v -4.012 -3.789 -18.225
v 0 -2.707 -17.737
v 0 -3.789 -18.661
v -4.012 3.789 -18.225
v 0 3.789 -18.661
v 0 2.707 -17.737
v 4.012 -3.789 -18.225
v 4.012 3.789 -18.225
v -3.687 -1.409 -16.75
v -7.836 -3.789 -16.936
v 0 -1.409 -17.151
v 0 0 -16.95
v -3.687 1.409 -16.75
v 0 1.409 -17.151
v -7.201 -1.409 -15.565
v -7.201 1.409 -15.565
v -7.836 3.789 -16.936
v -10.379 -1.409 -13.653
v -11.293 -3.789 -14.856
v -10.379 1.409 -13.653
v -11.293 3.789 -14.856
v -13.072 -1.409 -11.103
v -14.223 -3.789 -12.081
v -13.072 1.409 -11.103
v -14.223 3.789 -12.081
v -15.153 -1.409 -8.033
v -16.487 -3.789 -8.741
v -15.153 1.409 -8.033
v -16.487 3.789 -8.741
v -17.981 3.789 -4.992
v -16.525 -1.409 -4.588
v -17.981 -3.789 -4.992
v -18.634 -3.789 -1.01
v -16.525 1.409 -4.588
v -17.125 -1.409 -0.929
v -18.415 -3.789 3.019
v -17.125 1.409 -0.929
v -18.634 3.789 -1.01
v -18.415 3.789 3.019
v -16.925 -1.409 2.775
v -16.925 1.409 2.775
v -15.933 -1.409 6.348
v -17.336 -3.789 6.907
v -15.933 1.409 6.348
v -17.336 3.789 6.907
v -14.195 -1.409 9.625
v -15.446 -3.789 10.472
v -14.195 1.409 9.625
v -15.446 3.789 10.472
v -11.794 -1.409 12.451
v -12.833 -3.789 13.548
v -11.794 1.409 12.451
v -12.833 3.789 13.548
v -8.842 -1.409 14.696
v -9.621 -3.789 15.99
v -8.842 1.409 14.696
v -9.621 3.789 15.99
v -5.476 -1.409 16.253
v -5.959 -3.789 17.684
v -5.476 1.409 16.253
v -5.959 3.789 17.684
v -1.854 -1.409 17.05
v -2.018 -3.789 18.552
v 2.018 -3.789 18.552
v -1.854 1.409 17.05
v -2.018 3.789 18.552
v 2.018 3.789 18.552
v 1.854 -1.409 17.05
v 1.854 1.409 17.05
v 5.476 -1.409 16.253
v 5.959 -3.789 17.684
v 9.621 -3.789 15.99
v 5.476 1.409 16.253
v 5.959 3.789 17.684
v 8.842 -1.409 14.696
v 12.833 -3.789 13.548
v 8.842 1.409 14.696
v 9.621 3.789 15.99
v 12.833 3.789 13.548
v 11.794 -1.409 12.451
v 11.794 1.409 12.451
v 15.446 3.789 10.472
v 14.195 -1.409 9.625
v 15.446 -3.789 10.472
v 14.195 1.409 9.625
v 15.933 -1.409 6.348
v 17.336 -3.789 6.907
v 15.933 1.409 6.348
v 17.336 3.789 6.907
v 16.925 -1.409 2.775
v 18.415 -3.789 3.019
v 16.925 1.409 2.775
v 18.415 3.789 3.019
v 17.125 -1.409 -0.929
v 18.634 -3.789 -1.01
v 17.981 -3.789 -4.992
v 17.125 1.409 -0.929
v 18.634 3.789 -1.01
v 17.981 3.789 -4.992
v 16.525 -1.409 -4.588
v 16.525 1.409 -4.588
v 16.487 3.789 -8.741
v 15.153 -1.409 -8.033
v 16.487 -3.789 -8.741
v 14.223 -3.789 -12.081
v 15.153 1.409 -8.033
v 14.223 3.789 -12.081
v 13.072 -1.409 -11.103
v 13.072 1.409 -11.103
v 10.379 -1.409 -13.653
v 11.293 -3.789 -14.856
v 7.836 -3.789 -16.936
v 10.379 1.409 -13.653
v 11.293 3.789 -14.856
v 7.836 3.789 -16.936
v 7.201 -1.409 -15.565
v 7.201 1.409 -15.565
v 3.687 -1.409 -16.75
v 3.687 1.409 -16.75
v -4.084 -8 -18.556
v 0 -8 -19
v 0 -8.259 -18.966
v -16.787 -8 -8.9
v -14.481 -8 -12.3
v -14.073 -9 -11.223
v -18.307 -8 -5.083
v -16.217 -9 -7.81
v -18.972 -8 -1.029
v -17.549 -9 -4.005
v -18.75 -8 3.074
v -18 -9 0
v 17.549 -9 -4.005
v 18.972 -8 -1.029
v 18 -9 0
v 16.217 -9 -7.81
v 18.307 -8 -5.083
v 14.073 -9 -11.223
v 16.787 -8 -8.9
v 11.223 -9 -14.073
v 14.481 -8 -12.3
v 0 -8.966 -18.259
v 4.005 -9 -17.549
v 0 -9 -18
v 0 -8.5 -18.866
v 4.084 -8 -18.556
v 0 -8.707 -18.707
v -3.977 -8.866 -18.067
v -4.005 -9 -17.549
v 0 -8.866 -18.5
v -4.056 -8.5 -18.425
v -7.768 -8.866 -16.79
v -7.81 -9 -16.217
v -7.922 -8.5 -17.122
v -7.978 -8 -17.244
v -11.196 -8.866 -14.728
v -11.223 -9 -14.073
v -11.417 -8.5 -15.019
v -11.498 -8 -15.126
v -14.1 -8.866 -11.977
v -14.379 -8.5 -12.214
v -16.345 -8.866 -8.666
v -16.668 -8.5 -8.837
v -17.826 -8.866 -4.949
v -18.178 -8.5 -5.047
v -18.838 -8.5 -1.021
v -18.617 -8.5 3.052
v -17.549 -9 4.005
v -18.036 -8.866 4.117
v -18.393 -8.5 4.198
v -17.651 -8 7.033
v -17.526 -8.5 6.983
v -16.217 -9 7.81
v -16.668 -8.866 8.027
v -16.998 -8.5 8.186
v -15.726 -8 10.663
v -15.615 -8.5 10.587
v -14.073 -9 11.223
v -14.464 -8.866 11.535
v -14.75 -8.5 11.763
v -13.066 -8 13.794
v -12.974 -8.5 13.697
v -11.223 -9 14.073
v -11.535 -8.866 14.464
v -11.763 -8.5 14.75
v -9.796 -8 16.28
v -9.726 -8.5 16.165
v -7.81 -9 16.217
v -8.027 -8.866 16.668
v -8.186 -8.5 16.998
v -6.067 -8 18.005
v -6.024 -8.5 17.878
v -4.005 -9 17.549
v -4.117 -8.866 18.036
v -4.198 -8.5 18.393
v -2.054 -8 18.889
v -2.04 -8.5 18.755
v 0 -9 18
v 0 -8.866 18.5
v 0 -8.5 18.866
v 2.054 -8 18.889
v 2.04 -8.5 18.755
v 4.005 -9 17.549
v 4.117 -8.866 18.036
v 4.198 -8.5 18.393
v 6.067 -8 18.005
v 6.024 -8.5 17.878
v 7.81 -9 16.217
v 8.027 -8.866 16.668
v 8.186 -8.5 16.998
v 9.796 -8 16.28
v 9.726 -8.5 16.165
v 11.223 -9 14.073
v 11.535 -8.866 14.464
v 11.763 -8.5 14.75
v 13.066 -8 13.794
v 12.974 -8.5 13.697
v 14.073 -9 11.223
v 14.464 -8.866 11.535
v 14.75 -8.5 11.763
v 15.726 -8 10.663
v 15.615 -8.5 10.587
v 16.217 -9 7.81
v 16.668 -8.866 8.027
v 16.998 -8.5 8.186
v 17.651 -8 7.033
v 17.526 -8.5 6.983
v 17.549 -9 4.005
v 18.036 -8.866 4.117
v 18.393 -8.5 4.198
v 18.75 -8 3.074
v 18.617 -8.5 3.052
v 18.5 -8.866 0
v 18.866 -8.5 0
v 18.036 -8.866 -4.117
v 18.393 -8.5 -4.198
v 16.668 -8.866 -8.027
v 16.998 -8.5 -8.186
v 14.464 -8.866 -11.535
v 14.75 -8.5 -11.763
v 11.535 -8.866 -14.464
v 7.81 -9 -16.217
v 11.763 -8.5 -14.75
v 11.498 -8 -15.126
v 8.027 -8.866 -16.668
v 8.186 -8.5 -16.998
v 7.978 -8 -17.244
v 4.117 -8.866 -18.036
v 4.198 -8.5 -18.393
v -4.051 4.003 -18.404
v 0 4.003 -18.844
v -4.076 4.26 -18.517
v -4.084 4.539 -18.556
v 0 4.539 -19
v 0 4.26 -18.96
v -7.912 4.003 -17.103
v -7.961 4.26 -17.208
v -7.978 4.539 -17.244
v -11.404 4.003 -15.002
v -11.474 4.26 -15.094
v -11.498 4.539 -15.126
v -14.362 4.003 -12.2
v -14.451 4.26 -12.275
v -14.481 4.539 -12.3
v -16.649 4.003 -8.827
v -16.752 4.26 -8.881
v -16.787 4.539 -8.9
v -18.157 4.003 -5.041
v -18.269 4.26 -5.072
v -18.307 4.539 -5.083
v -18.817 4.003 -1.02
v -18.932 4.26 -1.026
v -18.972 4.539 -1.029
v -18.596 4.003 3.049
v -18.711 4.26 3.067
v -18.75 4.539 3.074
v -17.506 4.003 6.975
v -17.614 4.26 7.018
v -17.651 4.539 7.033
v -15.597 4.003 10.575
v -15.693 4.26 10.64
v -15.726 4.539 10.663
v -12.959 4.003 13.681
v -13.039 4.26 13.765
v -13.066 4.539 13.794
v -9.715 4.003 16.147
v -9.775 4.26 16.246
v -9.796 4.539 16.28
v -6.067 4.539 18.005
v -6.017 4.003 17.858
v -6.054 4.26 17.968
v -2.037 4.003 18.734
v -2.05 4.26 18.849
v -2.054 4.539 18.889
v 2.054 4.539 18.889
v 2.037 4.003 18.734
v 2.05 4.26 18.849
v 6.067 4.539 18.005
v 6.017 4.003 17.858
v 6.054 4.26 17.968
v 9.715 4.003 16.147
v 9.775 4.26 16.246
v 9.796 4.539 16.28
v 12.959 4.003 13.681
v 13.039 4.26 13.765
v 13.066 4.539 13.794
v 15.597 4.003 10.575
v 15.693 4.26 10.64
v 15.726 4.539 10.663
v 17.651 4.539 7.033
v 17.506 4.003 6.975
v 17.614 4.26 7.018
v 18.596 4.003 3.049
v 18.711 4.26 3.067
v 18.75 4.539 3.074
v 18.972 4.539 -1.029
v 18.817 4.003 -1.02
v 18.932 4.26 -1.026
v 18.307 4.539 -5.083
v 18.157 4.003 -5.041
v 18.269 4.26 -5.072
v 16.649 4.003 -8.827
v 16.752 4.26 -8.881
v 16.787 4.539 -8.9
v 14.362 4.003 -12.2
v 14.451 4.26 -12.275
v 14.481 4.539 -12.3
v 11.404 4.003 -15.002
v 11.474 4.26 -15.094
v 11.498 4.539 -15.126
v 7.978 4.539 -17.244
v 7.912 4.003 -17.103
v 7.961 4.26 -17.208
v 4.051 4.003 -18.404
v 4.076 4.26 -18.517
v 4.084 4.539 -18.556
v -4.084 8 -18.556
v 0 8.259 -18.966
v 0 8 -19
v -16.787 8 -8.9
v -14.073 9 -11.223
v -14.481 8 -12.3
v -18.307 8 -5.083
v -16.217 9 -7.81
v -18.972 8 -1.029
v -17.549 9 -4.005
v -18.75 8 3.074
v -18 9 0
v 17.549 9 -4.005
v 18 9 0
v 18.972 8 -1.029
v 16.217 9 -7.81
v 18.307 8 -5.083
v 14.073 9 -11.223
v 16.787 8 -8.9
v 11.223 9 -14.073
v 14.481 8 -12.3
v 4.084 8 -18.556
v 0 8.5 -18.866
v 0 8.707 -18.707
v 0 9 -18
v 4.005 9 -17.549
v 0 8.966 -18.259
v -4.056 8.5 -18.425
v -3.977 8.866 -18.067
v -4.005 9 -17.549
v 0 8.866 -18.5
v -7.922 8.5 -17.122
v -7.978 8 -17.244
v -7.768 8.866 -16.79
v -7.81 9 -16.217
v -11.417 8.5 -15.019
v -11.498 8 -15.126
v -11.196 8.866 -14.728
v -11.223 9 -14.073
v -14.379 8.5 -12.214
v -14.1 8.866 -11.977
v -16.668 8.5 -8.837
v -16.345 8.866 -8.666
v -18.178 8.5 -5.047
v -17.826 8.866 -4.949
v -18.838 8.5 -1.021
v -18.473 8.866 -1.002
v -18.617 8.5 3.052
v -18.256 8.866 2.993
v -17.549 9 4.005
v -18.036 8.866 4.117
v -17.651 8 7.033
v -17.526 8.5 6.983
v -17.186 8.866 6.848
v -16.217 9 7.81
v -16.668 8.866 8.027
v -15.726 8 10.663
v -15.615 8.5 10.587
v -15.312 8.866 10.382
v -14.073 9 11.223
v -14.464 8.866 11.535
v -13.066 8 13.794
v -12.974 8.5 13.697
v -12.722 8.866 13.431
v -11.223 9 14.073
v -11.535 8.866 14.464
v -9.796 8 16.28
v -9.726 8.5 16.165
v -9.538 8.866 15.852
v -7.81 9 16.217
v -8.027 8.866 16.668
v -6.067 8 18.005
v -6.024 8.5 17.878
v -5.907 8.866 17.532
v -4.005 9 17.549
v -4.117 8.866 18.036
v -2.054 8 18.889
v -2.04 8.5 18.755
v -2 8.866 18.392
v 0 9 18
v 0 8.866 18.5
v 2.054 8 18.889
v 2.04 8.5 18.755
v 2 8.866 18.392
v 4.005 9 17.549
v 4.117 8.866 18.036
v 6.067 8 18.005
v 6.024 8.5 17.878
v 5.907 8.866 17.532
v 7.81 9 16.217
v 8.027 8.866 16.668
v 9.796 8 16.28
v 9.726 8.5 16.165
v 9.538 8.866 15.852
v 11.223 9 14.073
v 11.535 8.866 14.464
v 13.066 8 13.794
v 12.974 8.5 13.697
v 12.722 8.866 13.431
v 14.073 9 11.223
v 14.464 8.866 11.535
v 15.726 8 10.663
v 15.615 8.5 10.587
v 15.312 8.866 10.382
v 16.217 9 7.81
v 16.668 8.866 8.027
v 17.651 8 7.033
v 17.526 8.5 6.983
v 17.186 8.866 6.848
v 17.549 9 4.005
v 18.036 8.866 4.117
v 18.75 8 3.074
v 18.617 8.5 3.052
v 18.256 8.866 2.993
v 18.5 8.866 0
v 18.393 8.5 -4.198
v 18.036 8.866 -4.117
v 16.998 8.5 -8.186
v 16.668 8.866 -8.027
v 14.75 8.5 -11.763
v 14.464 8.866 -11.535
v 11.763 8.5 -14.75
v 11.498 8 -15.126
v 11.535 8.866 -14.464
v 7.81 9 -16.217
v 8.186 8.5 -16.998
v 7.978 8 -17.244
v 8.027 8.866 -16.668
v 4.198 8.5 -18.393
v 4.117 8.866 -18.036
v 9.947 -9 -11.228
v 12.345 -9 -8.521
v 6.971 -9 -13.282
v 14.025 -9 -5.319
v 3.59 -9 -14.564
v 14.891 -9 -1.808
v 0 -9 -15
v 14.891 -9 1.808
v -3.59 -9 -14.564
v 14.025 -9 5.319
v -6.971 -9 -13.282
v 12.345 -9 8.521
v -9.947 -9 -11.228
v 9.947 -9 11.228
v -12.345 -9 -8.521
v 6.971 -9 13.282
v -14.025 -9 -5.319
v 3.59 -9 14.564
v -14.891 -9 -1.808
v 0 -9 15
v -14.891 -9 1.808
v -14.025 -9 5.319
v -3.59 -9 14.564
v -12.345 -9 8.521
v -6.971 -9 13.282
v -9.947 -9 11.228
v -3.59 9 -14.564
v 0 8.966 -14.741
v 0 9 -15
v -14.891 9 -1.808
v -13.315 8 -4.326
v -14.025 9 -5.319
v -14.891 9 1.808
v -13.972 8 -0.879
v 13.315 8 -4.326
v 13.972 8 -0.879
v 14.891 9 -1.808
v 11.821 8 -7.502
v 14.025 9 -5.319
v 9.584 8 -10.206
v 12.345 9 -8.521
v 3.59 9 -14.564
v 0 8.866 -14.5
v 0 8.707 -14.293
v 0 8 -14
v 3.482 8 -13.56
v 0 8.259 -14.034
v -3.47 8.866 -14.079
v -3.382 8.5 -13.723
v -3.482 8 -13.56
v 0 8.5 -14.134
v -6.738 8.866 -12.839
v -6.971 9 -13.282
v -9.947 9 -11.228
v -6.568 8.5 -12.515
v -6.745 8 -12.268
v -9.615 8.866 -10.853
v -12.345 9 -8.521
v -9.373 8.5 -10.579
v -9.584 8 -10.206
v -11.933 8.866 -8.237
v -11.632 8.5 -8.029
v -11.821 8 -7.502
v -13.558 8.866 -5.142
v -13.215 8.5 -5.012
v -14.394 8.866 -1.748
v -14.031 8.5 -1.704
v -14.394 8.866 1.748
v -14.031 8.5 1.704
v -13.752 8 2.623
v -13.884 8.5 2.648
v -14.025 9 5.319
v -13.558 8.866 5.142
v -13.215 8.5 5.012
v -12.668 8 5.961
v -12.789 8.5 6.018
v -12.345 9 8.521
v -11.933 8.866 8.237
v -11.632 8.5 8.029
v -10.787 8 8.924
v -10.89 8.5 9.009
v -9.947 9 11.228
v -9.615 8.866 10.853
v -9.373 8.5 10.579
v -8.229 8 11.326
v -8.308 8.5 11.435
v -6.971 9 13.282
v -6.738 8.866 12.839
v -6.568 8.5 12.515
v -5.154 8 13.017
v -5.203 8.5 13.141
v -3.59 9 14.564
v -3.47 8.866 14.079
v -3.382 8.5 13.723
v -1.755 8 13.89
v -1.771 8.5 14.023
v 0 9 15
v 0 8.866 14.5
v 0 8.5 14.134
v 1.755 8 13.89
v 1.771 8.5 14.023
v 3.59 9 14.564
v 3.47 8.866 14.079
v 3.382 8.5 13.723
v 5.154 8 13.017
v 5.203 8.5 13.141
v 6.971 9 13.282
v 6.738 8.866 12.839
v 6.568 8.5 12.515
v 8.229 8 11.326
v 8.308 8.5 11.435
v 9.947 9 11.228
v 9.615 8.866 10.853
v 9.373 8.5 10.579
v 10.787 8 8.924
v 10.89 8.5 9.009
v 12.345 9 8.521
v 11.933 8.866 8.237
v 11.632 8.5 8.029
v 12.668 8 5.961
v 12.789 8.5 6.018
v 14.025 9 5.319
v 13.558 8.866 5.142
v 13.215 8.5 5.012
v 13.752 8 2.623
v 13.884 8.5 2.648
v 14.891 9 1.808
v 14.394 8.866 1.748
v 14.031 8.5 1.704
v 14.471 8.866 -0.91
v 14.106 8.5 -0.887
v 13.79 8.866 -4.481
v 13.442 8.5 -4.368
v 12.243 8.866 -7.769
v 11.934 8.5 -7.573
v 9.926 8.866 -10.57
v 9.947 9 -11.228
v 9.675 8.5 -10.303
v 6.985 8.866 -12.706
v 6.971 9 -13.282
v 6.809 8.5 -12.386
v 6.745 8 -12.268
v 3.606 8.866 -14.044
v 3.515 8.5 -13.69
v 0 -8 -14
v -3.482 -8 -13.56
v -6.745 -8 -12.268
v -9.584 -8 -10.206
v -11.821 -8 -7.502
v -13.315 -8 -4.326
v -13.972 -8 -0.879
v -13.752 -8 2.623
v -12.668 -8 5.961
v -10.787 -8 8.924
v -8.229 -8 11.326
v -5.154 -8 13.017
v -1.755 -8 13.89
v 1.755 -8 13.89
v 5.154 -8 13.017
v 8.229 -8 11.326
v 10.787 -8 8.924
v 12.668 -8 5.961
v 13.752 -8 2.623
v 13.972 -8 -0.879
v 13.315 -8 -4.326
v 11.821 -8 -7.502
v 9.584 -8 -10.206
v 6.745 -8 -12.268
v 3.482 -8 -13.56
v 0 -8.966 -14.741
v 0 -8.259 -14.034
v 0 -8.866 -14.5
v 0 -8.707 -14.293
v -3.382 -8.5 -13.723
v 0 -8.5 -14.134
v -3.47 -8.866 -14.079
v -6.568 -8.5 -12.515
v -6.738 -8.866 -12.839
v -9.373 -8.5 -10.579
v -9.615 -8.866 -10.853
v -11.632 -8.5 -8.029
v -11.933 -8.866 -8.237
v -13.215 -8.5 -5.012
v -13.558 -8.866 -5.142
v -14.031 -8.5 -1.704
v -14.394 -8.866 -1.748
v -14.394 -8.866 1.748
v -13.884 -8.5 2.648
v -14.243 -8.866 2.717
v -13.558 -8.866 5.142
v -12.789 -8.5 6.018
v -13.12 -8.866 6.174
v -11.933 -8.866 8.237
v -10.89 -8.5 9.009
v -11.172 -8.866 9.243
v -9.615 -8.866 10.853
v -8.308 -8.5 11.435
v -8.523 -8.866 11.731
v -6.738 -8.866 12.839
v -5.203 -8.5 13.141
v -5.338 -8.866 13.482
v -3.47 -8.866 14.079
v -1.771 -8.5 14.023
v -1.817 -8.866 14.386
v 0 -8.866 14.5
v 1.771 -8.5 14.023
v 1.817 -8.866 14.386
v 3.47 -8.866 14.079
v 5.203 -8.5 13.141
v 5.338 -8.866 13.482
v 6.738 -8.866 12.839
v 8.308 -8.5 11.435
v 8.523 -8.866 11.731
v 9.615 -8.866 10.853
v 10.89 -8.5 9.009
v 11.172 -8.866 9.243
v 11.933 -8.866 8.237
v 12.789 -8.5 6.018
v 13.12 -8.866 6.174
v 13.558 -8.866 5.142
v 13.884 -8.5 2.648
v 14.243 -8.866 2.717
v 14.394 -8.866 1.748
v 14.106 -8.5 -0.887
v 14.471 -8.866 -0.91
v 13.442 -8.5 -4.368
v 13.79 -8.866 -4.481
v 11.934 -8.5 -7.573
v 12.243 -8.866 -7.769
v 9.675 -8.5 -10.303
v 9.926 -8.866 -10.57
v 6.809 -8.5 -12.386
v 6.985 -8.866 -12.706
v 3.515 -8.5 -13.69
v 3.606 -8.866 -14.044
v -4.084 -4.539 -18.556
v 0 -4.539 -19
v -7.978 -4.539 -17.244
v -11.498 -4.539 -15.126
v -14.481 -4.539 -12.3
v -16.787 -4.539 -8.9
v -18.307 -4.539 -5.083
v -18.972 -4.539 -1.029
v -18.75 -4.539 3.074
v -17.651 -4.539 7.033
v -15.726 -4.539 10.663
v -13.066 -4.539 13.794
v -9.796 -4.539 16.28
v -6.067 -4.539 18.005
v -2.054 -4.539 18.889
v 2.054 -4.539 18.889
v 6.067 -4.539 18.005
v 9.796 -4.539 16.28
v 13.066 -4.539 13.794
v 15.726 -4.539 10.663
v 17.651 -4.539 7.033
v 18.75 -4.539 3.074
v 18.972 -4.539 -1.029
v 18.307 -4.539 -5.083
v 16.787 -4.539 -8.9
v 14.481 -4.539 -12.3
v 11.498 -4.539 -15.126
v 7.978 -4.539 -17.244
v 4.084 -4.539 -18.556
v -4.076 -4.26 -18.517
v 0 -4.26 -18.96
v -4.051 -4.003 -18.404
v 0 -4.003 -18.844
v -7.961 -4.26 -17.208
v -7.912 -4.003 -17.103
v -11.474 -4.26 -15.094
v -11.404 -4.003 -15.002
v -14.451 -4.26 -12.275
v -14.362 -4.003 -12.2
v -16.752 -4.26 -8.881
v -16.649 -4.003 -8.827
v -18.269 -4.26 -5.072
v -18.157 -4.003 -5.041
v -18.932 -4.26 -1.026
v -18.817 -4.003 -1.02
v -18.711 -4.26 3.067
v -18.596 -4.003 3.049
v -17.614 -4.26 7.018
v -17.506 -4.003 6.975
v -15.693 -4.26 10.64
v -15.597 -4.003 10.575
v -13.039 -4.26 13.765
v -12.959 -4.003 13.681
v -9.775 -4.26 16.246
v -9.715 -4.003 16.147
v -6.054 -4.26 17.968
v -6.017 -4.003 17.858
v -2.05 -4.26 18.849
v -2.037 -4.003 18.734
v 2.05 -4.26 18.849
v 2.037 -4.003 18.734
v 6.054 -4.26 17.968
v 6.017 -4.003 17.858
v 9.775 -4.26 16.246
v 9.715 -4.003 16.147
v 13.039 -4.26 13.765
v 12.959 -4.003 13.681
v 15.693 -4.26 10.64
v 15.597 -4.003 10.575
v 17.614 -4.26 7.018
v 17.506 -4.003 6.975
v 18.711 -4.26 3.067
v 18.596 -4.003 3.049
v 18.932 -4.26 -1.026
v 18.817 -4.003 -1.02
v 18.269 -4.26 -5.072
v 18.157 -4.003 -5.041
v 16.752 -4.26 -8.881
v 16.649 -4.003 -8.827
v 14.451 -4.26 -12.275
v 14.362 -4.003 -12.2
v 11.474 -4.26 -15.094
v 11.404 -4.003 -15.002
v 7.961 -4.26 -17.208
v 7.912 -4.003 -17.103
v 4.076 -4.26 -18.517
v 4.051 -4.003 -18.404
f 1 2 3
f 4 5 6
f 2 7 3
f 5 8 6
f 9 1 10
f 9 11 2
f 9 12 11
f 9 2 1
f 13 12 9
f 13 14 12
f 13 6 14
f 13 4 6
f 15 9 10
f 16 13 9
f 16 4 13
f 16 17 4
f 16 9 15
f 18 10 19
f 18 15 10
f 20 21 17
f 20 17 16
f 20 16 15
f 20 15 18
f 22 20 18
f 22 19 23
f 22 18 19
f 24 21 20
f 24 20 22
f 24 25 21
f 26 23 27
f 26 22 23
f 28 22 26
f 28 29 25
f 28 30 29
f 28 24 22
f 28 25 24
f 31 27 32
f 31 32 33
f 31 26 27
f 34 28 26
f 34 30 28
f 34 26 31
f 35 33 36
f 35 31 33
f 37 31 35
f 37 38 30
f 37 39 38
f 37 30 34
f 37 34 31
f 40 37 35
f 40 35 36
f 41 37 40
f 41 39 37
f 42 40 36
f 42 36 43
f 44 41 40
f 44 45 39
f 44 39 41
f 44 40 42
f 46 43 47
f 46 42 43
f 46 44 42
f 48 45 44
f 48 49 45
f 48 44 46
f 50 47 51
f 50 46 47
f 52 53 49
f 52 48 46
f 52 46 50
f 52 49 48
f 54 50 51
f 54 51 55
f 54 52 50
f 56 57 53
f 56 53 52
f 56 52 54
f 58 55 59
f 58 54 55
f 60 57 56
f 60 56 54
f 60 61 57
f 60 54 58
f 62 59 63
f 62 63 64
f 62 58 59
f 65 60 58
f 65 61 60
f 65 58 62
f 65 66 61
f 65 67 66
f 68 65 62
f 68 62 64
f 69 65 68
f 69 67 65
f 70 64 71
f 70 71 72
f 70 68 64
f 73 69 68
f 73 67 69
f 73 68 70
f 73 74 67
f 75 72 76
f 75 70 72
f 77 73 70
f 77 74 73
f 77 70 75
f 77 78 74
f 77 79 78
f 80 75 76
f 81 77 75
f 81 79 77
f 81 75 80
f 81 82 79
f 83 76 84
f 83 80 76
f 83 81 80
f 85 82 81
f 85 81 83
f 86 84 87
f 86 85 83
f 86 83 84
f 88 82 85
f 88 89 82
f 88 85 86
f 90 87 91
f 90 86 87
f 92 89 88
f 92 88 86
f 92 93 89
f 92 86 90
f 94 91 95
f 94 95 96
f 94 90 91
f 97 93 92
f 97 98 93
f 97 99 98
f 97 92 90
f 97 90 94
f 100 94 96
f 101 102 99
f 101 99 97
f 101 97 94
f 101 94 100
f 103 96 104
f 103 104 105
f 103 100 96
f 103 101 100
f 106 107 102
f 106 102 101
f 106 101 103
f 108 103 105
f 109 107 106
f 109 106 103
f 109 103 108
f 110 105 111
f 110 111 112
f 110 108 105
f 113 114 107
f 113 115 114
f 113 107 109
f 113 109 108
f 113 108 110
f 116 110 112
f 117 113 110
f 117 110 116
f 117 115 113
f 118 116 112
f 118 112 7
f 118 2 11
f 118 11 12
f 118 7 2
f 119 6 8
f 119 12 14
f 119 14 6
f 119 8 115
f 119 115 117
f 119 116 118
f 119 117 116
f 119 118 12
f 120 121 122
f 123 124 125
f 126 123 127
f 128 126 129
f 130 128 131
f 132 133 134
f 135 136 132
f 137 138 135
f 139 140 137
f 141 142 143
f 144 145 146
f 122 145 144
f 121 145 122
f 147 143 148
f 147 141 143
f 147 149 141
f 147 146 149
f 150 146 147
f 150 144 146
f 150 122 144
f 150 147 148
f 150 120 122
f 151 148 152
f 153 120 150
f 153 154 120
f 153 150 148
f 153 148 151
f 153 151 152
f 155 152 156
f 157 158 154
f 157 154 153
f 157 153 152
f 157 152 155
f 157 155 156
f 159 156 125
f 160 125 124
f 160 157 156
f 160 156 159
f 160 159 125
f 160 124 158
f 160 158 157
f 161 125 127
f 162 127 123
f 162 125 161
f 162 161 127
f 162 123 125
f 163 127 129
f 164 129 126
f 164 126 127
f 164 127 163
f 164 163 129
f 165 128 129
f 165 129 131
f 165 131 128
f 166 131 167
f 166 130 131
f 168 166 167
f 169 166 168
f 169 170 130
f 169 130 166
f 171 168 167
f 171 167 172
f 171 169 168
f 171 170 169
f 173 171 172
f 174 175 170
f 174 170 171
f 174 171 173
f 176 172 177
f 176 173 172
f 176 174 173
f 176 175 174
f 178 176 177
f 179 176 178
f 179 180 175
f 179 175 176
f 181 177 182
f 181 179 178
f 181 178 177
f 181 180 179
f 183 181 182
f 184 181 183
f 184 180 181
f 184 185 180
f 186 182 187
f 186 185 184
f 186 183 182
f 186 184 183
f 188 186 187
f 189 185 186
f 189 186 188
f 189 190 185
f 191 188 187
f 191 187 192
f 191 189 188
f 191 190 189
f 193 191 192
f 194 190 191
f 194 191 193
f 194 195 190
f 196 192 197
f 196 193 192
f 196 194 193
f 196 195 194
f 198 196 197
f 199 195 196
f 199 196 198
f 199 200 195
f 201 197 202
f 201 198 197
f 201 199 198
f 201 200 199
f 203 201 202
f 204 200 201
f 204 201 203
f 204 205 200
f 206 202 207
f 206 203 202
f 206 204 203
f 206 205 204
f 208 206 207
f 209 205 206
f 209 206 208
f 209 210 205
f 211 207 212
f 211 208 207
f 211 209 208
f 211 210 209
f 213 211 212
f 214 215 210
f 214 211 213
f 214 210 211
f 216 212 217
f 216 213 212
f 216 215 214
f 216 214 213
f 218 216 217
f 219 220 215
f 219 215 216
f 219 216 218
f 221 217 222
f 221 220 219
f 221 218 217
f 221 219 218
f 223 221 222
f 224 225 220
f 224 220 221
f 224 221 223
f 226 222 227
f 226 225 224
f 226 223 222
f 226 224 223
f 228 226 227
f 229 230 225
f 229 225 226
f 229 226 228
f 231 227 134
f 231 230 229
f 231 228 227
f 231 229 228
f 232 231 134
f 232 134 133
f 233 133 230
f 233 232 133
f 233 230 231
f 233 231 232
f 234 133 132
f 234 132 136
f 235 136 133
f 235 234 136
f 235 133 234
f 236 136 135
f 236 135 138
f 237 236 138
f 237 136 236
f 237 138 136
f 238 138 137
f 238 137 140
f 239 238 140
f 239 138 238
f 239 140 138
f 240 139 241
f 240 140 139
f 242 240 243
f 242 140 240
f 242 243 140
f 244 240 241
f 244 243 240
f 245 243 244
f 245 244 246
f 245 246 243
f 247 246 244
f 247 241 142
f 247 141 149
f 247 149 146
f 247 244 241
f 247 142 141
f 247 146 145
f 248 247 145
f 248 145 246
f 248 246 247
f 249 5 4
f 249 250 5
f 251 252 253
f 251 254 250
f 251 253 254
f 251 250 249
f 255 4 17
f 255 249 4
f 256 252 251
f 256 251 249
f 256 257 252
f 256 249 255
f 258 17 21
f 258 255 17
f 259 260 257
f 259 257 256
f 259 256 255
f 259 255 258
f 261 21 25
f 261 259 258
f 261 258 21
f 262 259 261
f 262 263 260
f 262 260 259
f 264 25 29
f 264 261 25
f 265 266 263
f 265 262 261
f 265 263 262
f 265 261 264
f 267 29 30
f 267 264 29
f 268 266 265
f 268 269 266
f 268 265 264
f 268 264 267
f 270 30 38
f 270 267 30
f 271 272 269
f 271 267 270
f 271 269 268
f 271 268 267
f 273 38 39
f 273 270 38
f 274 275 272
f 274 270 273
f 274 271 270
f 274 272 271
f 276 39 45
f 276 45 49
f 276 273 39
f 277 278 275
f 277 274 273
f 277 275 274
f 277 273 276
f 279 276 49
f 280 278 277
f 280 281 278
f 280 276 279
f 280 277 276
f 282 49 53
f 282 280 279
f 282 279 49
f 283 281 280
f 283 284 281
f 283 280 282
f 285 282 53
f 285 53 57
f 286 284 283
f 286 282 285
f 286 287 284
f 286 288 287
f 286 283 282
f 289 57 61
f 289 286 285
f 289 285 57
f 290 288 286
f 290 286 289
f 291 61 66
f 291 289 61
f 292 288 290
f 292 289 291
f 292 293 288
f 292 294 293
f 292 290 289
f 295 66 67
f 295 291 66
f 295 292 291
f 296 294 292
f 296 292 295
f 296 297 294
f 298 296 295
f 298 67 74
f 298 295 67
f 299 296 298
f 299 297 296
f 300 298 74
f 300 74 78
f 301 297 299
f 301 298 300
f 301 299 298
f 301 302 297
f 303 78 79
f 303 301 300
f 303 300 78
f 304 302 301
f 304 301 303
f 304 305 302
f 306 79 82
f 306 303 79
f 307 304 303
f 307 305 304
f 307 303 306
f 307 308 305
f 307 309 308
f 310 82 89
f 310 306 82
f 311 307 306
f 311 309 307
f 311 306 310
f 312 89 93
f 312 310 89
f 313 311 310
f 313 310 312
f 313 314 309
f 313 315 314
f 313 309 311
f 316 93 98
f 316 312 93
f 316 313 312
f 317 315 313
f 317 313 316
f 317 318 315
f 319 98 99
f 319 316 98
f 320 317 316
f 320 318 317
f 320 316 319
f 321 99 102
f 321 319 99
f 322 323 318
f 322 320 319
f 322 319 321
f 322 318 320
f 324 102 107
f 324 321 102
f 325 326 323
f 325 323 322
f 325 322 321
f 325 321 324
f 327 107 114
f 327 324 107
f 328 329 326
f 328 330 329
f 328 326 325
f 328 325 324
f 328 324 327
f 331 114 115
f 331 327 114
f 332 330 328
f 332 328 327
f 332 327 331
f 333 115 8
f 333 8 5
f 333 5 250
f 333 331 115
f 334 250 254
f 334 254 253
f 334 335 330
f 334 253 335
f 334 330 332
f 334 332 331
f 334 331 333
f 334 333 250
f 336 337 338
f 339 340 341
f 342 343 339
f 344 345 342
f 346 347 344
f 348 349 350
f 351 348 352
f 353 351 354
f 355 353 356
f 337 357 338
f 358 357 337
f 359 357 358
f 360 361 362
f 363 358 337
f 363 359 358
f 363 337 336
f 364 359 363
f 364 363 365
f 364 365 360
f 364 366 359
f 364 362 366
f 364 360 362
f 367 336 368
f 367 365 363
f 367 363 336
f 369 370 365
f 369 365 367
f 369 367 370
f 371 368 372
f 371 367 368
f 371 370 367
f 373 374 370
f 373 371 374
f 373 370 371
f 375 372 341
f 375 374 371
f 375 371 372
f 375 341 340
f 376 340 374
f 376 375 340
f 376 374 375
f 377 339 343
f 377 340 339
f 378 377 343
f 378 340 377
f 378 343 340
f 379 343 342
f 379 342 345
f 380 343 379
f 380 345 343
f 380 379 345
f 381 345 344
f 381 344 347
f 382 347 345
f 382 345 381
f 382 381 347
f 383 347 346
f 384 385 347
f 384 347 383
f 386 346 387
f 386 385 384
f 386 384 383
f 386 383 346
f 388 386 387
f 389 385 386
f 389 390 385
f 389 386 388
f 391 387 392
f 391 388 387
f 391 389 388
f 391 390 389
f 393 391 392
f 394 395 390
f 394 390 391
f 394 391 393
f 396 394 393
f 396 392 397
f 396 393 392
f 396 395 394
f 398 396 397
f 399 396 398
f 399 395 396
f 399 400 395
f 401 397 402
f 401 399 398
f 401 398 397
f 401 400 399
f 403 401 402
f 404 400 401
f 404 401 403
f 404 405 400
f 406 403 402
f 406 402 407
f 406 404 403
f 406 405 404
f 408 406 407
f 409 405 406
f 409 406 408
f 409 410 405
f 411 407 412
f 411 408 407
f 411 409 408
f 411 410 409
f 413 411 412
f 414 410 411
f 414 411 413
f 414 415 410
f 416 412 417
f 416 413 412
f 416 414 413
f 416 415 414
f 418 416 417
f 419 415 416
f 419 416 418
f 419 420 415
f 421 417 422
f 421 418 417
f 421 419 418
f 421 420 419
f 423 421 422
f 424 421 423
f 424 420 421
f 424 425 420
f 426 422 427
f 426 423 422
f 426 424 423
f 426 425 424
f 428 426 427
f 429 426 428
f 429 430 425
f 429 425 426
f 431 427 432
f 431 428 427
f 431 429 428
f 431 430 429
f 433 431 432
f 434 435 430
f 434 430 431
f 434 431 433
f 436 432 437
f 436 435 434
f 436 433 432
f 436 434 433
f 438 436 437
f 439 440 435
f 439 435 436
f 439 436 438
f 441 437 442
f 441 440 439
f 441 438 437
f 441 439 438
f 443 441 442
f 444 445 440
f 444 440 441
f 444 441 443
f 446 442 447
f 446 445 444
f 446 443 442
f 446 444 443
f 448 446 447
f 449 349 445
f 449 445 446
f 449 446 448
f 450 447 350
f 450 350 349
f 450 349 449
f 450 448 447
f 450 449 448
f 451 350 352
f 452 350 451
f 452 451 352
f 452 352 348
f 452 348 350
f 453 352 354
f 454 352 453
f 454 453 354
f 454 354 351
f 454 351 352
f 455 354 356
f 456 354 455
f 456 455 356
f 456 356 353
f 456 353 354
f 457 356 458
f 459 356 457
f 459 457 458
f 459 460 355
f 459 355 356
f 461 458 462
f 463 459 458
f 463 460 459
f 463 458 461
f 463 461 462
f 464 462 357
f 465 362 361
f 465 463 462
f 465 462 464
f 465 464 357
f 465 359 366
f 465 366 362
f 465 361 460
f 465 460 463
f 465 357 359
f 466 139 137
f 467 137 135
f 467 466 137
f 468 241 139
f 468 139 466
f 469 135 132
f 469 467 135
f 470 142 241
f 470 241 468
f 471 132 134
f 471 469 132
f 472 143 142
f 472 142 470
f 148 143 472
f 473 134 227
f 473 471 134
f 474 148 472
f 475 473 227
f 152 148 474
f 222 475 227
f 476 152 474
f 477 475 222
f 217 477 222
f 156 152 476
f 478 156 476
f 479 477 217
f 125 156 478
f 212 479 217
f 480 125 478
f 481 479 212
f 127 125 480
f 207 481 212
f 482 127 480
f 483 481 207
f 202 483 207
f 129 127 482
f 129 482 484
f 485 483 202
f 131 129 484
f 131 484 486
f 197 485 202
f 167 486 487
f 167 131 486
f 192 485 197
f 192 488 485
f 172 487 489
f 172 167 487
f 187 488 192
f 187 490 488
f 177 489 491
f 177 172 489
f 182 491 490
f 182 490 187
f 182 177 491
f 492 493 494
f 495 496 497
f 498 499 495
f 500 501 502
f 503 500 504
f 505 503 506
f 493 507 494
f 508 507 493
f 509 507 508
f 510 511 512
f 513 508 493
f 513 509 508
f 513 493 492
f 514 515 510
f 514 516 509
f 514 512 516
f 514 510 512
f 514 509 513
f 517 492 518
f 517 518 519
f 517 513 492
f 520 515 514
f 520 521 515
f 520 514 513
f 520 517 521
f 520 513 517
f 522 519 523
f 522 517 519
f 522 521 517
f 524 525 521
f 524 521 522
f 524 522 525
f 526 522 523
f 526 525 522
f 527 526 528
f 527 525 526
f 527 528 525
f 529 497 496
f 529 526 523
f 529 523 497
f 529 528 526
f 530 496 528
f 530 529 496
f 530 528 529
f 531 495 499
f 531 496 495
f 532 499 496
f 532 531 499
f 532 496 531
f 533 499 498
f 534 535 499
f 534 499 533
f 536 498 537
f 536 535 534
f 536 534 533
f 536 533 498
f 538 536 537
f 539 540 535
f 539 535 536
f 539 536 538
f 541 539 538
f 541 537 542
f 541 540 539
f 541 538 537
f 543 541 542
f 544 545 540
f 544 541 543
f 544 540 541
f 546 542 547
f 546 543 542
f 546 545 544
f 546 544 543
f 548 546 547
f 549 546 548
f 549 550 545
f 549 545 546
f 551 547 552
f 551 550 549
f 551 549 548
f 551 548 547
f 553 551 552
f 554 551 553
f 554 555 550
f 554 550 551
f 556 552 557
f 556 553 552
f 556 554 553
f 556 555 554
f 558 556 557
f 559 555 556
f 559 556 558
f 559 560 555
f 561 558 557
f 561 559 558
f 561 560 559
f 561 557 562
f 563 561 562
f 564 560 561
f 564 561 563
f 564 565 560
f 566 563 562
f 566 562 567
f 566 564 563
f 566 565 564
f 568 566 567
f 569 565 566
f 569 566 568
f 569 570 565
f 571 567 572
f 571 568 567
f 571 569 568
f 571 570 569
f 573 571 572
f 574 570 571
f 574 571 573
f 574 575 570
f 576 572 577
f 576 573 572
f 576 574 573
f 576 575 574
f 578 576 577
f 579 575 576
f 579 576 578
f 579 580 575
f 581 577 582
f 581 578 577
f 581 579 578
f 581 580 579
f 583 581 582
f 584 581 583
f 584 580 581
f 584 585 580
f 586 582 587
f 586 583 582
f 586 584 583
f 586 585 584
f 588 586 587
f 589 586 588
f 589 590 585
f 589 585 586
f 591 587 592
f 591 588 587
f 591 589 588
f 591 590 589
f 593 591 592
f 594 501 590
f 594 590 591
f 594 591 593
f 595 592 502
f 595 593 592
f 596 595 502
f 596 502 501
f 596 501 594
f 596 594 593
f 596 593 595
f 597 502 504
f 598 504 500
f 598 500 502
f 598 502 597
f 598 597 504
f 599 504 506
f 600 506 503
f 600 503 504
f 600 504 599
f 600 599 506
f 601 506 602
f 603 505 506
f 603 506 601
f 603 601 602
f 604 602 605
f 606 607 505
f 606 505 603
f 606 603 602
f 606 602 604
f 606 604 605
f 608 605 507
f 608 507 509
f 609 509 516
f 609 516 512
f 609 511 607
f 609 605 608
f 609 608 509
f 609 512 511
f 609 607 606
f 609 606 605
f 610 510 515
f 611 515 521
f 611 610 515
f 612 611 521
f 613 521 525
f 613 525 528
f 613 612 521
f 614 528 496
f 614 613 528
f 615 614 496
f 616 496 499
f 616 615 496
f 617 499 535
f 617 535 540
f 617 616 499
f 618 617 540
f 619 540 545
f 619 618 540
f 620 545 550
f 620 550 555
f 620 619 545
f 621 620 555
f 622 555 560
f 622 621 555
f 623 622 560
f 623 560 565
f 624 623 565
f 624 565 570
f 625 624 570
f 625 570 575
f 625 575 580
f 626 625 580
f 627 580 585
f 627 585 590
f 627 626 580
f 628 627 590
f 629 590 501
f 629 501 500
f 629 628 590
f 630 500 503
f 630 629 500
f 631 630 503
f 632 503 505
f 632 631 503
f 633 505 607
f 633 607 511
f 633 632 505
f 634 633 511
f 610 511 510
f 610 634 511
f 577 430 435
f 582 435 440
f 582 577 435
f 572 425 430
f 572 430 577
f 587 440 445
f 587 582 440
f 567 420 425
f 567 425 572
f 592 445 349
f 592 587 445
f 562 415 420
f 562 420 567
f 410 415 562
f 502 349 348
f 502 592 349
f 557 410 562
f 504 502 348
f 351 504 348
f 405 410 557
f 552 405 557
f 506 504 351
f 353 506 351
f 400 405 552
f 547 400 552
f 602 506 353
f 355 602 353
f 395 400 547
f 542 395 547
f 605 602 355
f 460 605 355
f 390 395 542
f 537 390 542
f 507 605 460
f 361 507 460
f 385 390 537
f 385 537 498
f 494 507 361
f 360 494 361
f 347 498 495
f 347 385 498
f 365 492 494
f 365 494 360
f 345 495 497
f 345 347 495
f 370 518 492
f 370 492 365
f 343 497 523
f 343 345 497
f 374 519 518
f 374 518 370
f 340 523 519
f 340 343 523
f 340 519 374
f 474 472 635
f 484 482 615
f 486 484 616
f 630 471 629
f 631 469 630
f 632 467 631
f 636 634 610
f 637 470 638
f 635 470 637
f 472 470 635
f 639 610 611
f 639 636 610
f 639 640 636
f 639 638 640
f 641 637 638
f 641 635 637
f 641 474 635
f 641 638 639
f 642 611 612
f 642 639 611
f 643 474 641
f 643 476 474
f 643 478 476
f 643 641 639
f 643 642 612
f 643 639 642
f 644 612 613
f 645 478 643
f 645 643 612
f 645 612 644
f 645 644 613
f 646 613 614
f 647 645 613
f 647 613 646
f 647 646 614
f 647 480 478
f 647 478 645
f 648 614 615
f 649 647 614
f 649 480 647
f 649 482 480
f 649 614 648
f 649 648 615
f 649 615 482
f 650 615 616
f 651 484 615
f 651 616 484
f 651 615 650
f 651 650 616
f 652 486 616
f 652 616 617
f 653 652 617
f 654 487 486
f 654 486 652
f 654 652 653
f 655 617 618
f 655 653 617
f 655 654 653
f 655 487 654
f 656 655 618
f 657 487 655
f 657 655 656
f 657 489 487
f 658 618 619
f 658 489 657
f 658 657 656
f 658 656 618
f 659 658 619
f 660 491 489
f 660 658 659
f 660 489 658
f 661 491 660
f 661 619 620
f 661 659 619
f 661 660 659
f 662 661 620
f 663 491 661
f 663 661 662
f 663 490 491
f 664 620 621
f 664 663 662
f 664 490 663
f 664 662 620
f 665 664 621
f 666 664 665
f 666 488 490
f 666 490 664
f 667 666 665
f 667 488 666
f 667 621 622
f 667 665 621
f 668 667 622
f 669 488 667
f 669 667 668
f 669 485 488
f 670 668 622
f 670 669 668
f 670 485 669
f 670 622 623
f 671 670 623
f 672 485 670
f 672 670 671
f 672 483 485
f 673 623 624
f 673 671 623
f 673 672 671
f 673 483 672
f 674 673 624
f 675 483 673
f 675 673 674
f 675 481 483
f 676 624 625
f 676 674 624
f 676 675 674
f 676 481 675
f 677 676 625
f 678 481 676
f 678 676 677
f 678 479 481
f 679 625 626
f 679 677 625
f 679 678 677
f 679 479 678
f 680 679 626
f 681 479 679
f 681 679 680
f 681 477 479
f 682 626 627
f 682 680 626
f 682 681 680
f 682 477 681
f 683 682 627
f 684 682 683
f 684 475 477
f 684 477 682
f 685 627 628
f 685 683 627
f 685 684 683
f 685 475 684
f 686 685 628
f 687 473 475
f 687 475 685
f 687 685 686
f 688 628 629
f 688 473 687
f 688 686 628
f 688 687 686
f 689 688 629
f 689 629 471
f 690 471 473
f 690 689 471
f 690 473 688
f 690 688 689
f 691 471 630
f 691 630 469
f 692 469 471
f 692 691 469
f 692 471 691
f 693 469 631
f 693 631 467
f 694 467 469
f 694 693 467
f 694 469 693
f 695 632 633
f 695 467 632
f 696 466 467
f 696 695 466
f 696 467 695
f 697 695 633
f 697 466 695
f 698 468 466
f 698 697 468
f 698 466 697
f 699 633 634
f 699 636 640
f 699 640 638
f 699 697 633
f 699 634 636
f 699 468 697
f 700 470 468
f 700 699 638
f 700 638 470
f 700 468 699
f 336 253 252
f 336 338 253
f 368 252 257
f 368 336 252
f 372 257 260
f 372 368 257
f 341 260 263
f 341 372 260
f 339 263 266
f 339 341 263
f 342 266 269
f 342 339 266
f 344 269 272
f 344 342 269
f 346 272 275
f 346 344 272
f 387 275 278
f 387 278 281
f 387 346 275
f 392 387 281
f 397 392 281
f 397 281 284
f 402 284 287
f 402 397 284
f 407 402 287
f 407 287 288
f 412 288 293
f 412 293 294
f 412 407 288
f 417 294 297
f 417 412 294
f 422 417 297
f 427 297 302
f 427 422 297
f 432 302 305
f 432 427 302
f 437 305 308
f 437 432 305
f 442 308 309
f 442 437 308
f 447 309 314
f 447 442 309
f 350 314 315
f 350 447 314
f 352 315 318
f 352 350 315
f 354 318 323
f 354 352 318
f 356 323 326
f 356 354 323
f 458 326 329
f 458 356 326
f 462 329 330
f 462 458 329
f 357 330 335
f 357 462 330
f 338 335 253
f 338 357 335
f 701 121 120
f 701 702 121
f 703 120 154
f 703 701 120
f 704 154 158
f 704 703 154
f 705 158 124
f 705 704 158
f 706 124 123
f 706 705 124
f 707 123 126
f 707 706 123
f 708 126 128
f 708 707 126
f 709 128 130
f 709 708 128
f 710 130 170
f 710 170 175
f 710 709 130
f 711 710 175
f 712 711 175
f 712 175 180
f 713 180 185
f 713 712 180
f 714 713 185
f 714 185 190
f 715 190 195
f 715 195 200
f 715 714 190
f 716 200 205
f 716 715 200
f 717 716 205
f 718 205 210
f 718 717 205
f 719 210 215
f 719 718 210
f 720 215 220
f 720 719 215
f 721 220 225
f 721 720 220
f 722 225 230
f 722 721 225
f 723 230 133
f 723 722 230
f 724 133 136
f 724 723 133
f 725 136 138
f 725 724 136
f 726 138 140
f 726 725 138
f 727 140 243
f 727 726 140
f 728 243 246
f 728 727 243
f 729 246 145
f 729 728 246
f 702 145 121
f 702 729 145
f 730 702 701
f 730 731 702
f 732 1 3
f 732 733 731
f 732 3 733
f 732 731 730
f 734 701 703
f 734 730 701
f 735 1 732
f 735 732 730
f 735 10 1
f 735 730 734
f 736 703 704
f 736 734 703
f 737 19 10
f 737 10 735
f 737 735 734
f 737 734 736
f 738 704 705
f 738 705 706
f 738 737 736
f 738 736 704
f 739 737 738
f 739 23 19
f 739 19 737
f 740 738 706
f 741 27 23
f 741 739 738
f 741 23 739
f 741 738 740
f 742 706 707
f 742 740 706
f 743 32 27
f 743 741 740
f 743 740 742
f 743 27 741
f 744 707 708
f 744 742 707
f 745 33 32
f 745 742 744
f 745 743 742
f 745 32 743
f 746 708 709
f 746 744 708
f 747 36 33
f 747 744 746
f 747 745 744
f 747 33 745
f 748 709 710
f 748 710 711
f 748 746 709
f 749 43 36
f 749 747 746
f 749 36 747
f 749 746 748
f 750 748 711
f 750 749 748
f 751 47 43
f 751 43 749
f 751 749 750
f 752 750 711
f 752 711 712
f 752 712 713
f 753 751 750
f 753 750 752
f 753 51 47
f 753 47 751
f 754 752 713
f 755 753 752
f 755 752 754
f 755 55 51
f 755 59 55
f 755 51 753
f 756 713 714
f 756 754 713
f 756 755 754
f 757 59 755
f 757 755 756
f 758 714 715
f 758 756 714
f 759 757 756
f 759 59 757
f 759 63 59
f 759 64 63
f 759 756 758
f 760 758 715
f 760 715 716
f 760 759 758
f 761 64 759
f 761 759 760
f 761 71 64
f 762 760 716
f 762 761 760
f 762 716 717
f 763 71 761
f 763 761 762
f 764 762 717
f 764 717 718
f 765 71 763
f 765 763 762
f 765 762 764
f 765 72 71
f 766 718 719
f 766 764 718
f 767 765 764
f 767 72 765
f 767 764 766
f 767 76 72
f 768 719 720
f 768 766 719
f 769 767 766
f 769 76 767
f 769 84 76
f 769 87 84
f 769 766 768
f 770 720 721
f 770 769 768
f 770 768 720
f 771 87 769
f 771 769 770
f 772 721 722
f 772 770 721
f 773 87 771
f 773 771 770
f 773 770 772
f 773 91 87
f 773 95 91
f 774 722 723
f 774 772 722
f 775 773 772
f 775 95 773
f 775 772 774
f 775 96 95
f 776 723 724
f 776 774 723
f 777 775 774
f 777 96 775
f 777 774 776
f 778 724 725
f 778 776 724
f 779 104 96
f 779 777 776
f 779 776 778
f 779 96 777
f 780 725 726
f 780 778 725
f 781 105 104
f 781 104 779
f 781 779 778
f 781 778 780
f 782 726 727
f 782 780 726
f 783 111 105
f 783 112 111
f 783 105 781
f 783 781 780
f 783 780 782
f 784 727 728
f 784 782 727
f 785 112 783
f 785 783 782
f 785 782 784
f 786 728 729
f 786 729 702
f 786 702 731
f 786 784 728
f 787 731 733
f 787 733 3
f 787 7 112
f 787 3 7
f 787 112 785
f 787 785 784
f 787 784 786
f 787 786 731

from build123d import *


with BuildPart() as part:
    # Sketch1 → Revolve1 (revolve)
    with BuildSketch(Plane(origin=(0, 0, 0), x_dir=(0, 0, -1), z_dir=(1, 0, 0))):
        with BuildLine():
            Line((14, 8), (14, -8))
            ThreePointArc((14, -8), (14.292893219, -8.707106781), (15, -9))
            Line((15, -9), (18, -9))
            ThreePointArc((18, -9), (18.707106781, -8.707106781), (19, -8))
            Line((19, -8), (19, -4.538997687))
            ThreePointArc((19, -4.538997687), (18.911360803, -4.127389271), (18.661157025, -3.788750135))
            ThreePointArc((18.661157025, -3.788750135), (16.95, 0), (18.661157025, 3.788750135))
            ThreePointArc((18.661157025, 3.788750135), (18.911360803, 4.127389271), (19, 4.538997687))
            Line((19, 4.538997687), (19, 8))
            ThreePointArc((19, 8), (18.707106781, 8.707106781), (18, 9))
            Line((18, 9), (15, 9))
            ThreePointArc((15, 9), (14.292893219, 8.707106781), (14, 8))
        make_face()
    revolve(axis=Axis((0, -9.810774163, 0), (0, 1, 0)))


solid = part.part
